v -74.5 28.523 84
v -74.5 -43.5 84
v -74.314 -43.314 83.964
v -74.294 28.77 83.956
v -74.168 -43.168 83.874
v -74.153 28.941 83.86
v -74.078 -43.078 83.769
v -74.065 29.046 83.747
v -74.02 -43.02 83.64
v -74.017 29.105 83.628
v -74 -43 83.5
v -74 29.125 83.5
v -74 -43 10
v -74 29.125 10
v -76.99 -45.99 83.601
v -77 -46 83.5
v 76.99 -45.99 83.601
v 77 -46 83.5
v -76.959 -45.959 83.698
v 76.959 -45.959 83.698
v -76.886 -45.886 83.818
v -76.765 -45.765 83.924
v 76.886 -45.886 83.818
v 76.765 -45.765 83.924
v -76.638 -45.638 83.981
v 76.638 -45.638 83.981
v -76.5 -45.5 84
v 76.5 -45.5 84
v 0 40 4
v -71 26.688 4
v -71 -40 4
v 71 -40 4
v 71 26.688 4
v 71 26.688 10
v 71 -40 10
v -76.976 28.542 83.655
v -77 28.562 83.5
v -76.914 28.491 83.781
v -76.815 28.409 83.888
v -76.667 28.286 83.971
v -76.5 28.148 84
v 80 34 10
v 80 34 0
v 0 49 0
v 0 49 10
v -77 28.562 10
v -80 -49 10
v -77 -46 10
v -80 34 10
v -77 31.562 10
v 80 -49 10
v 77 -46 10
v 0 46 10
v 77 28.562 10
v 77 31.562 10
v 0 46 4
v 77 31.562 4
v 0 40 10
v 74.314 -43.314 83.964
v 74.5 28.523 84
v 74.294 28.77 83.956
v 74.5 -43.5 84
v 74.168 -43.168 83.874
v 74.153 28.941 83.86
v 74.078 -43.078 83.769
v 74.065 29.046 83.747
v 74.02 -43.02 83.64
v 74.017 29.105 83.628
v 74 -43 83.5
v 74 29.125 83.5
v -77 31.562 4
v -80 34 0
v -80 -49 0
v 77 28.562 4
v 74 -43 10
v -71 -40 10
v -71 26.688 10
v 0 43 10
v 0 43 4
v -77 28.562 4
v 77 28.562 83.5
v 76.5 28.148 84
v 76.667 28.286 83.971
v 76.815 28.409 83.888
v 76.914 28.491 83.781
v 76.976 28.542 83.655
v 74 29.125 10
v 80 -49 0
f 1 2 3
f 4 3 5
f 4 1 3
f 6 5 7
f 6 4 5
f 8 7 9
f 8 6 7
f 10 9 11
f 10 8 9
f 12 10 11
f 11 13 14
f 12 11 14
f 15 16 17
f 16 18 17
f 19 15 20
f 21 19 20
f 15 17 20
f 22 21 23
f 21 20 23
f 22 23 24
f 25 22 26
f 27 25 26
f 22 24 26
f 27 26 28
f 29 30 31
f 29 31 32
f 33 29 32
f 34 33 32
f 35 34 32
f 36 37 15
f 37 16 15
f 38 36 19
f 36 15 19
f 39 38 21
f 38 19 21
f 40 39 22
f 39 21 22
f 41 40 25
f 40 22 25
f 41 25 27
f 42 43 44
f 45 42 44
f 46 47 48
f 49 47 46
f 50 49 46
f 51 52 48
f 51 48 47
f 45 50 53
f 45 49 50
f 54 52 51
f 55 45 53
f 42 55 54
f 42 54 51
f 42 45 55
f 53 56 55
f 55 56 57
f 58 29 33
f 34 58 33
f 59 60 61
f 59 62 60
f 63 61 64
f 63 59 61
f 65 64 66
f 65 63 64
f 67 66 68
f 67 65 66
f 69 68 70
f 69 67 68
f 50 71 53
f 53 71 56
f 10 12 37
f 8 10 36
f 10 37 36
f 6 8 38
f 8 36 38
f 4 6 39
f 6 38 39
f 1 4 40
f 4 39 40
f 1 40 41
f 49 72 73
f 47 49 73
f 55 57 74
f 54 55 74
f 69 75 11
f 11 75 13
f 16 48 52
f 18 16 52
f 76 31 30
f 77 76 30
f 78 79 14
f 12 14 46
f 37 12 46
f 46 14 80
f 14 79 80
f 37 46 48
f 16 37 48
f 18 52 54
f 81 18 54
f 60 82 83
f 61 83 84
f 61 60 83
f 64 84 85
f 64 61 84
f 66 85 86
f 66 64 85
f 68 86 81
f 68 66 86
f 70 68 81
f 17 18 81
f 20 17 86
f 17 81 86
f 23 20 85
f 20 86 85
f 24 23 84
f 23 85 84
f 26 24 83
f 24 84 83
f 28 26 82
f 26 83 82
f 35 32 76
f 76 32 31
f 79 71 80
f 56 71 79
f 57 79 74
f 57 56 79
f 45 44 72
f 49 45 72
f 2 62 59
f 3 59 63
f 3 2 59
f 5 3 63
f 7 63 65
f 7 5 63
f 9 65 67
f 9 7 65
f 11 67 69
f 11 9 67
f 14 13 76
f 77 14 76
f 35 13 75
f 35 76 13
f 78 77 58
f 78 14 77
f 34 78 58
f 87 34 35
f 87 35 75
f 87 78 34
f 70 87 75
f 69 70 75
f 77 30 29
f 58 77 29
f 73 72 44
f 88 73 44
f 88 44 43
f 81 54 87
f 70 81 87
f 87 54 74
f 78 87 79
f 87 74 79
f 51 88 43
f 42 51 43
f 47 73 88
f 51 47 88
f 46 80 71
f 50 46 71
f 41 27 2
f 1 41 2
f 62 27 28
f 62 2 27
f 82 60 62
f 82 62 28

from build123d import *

# Parameters (mm, degrees)
F1_DEPTH = 4
F2_DEPTH = 10
F3_DEPTH = 84
F4_R     = 0.5


with BuildPart() as f1:
    # F0 (on Top) → F1 (new body)
    with BuildSketch(Plane.XY):
        Polygon((71, -40), (71, 26.6875), (0, 40), (-71, 26.6875), (-71, -40), align=None)
        Polygon((77, -46), (77, 25.5625), (74, 26.125), (74, -43), (-74, -43), (-74, 26.125), (-77, 25.5625), (-77, -46), align=None)
        Polygon((0, 43), (71, 29.6875), (71, 32.6875), (0, 46), (-71, 32.6875), (-71, 29.6875), align=None)
        Polygon((-80, -49), (80, -49), (80, 25), (77, 25.5625), (77, -46), (-77, -46), (-77, 25.5625), (-80, 25), align=None)
        Polygon((74, -43), (74, 26.125), (71, 26.6875), (71, -40), (-71, -40), (-71, 26.6875), (-74, 26.125), (-74, -43), align=None)
        Polygon((-80, 31), (-80, 28), (-77, 28.5625), (-77, 31.5625), align=None)
        Polygon((-80, 34), (-80, 31), (-77, 31.5625), (-77, 34.5625), align=None)
        Polygon((-80, 28), (-80, 25), (-77, 25.5625), (-77, 28.5625), align=None)
        Polygon((-77, 34.5625), (-77, 31.5625), (-74, 32.125), (-74, 35.125), align=None)
        Polygon((-77, 31.5625), (-77, 28.5625), (-74, 29.125), (-74, 32.125), align=None)
        Polygon((-77, 28.5625), (-77, 25.5625), (-74, 26.125), (-74, 29.125), align=None)
        Polygon((-74, 32.125), (-74, 29.125), (-71, 29.6875), (-71, 32.6875), align=None)
        Polygon((-74, 29.125), (-74, 26.125), (-71, 26.6875), (-71, 29.6875), align=None)
        Polygon((-74, 35.125), (-74, 32.125), (-71, 32.6875), (-71, 35.6875), align=None)
        Polygon((0, 46), (71, 32.6875), (71, 35.6875), (0, 49), (-71, 35.6875), (-71, 32.6875), align=None)
        Polygon((0, 40), (71, 26.6875), (71, 29.6875), (0, 43), (-71, 29.6875), (-71, 26.6875), align=None)
        Polygon((71, 32.6875), (74, 32.125), (74, 35.125), (71, 35.6875), align=None)
        Polygon((74, 32.125), (77, 31.5625), (77, 34.5625), (74, 35.125), align=None)
        Polygon((77, 31.5625), (80, 31), (80, 34), (77, 34.5625), align=None)
        Polygon((77, 28.5625), (80, 28), (80, 31), (77, 31.5625), align=None)
        Polygon((77, 25.5625), (80, 25), (80, 28), (77, 28.5625), align=None)
        Polygon((74, 26.125), (77, 25.5625), (77, 28.5625), (74, 29.125), align=None)
        Polygon((71, 26.6875), (74, 26.125), (74, 29.125), (71, 29.6875), align=None)
        Polygon((71, 29.6875), (74, 29.125), (74, 32.125), (71, 32.6875), align=None)
        Polygon((74, 29.125), (77, 28.5625), (77, 31.5625), (74, 32.125), align=None)
    extrude(amount=F1_DEPTH)

    # F0 (on Top) → F2 (join)
    with BuildSketch(Plane.XY):
        Polygon((77, 31.5625), (80, 31), (80, 34), (77, 34.5625), align=None)
        Polygon((74, 32.125), (77, 31.5625), (77, 34.5625), (74, 35.125), align=None)
        Polygon((71, 32.6875), (74, 32.125), (74, 35.125), (71, 35.6875), align=None)
        Polygon((0, 46), (71, 32.6875), (71, 35.6875), (0, 49), (-71, 35.6875), (-71, 32.6875), align=None)
        Polygon((-74, 35.125), (-74, 32.125), (-71, 32.6875), (-71, 35.6875), align=None)
        Polygon((-77, 34.5625), (-77, 31.5625), (-74, 32.125), (-74, 35.125), align=None)
        Polygon((-80, 34), (-80, 31), (-77, 31.5625), (-77, 34.5625), align=None)
        Polygon((-80, 28), (-80, 25), (-77, 25.5625), (-77, 28.5625), align=None)
        Polygon((-77, 28.5625), (-77, 25.5625), (-74, 26.125), (-74, 29.125), align=None)
        Polygon((-74, 29.125), (-74, 26.125), (-71, 26.6875), (-71, 29.6875), align=None)
        Polygon((0, 40), (71, 26.6875), (71, 29.6875), (0, 43), (-71, 29.6875), (-71, 26.6875), align=None)
        Polygon((77, 25.5625), (80, 25), (80, 28), (77, 28.5625), align=None)
        Polygon((74, 26.125), (77, 25.5625), (77, 28.5625), (74, 29.125), align=None)
        Polygon((71, 26.6875), (74, 26.125), (74, 29.125), (71, 29.6875), align=None)
        Polygon((-80, -49), (80, -49), (80, 25), (77, 25.5625), (77, -46), (-77, -46), (-77, 25.5625), (-80, 25), align=None)
        Polygon((74, -43), (74, 26.125), (71, 26.6875), (71, -40), (-71, -40), (-71, 26.6875), (-74, 26.125), (-74, -43), align=None)
        Polygon((-80, 31), (-80, 28), (-77, 28.5625), (-77, 31.5625), align=None)
        Polygon((77, 28.5625), (80, 28), (80, 31), (77, 31.5625), align=None)
    extrude(amount=F2_DEPTH)

    # F0 (on Top) → F3 (join)
    with BuildSketch(Plane.XY):
        Polygon((77, -46), (77, 25.5625), (74, 26.125), (74, -43), (-74, -43), (-74, 26.125), (-77, 25.5625), (-77, -46), align=None)
        Polygon((-77, 28.5625), (-77, 25.5625), (-74, 26.125), (-74, 29.125), align=None)
        Polygon((74, 26.125), (77, 25.5625), (77, 28.5625), (74, 29.125), align=None)
    extrude(amount=F3_DEPTH)

    # F4
    f4_edges = [f1.edges().sort_by_distance(p)[0] for p in [
        (77, -8.71875, 84),
        (75.5, 28.84375, 84),
        (74, -6.9375, 84),
        (0, -43, 84),
        (-74, -6.9375, 84),
        (-75.5, 28.84375, 84),
        (-77, -8.71875, 84),
        (0, -46, 84),
    ]]
    fillet(f4_edges, radius=F4_R)


solid = f1.part
